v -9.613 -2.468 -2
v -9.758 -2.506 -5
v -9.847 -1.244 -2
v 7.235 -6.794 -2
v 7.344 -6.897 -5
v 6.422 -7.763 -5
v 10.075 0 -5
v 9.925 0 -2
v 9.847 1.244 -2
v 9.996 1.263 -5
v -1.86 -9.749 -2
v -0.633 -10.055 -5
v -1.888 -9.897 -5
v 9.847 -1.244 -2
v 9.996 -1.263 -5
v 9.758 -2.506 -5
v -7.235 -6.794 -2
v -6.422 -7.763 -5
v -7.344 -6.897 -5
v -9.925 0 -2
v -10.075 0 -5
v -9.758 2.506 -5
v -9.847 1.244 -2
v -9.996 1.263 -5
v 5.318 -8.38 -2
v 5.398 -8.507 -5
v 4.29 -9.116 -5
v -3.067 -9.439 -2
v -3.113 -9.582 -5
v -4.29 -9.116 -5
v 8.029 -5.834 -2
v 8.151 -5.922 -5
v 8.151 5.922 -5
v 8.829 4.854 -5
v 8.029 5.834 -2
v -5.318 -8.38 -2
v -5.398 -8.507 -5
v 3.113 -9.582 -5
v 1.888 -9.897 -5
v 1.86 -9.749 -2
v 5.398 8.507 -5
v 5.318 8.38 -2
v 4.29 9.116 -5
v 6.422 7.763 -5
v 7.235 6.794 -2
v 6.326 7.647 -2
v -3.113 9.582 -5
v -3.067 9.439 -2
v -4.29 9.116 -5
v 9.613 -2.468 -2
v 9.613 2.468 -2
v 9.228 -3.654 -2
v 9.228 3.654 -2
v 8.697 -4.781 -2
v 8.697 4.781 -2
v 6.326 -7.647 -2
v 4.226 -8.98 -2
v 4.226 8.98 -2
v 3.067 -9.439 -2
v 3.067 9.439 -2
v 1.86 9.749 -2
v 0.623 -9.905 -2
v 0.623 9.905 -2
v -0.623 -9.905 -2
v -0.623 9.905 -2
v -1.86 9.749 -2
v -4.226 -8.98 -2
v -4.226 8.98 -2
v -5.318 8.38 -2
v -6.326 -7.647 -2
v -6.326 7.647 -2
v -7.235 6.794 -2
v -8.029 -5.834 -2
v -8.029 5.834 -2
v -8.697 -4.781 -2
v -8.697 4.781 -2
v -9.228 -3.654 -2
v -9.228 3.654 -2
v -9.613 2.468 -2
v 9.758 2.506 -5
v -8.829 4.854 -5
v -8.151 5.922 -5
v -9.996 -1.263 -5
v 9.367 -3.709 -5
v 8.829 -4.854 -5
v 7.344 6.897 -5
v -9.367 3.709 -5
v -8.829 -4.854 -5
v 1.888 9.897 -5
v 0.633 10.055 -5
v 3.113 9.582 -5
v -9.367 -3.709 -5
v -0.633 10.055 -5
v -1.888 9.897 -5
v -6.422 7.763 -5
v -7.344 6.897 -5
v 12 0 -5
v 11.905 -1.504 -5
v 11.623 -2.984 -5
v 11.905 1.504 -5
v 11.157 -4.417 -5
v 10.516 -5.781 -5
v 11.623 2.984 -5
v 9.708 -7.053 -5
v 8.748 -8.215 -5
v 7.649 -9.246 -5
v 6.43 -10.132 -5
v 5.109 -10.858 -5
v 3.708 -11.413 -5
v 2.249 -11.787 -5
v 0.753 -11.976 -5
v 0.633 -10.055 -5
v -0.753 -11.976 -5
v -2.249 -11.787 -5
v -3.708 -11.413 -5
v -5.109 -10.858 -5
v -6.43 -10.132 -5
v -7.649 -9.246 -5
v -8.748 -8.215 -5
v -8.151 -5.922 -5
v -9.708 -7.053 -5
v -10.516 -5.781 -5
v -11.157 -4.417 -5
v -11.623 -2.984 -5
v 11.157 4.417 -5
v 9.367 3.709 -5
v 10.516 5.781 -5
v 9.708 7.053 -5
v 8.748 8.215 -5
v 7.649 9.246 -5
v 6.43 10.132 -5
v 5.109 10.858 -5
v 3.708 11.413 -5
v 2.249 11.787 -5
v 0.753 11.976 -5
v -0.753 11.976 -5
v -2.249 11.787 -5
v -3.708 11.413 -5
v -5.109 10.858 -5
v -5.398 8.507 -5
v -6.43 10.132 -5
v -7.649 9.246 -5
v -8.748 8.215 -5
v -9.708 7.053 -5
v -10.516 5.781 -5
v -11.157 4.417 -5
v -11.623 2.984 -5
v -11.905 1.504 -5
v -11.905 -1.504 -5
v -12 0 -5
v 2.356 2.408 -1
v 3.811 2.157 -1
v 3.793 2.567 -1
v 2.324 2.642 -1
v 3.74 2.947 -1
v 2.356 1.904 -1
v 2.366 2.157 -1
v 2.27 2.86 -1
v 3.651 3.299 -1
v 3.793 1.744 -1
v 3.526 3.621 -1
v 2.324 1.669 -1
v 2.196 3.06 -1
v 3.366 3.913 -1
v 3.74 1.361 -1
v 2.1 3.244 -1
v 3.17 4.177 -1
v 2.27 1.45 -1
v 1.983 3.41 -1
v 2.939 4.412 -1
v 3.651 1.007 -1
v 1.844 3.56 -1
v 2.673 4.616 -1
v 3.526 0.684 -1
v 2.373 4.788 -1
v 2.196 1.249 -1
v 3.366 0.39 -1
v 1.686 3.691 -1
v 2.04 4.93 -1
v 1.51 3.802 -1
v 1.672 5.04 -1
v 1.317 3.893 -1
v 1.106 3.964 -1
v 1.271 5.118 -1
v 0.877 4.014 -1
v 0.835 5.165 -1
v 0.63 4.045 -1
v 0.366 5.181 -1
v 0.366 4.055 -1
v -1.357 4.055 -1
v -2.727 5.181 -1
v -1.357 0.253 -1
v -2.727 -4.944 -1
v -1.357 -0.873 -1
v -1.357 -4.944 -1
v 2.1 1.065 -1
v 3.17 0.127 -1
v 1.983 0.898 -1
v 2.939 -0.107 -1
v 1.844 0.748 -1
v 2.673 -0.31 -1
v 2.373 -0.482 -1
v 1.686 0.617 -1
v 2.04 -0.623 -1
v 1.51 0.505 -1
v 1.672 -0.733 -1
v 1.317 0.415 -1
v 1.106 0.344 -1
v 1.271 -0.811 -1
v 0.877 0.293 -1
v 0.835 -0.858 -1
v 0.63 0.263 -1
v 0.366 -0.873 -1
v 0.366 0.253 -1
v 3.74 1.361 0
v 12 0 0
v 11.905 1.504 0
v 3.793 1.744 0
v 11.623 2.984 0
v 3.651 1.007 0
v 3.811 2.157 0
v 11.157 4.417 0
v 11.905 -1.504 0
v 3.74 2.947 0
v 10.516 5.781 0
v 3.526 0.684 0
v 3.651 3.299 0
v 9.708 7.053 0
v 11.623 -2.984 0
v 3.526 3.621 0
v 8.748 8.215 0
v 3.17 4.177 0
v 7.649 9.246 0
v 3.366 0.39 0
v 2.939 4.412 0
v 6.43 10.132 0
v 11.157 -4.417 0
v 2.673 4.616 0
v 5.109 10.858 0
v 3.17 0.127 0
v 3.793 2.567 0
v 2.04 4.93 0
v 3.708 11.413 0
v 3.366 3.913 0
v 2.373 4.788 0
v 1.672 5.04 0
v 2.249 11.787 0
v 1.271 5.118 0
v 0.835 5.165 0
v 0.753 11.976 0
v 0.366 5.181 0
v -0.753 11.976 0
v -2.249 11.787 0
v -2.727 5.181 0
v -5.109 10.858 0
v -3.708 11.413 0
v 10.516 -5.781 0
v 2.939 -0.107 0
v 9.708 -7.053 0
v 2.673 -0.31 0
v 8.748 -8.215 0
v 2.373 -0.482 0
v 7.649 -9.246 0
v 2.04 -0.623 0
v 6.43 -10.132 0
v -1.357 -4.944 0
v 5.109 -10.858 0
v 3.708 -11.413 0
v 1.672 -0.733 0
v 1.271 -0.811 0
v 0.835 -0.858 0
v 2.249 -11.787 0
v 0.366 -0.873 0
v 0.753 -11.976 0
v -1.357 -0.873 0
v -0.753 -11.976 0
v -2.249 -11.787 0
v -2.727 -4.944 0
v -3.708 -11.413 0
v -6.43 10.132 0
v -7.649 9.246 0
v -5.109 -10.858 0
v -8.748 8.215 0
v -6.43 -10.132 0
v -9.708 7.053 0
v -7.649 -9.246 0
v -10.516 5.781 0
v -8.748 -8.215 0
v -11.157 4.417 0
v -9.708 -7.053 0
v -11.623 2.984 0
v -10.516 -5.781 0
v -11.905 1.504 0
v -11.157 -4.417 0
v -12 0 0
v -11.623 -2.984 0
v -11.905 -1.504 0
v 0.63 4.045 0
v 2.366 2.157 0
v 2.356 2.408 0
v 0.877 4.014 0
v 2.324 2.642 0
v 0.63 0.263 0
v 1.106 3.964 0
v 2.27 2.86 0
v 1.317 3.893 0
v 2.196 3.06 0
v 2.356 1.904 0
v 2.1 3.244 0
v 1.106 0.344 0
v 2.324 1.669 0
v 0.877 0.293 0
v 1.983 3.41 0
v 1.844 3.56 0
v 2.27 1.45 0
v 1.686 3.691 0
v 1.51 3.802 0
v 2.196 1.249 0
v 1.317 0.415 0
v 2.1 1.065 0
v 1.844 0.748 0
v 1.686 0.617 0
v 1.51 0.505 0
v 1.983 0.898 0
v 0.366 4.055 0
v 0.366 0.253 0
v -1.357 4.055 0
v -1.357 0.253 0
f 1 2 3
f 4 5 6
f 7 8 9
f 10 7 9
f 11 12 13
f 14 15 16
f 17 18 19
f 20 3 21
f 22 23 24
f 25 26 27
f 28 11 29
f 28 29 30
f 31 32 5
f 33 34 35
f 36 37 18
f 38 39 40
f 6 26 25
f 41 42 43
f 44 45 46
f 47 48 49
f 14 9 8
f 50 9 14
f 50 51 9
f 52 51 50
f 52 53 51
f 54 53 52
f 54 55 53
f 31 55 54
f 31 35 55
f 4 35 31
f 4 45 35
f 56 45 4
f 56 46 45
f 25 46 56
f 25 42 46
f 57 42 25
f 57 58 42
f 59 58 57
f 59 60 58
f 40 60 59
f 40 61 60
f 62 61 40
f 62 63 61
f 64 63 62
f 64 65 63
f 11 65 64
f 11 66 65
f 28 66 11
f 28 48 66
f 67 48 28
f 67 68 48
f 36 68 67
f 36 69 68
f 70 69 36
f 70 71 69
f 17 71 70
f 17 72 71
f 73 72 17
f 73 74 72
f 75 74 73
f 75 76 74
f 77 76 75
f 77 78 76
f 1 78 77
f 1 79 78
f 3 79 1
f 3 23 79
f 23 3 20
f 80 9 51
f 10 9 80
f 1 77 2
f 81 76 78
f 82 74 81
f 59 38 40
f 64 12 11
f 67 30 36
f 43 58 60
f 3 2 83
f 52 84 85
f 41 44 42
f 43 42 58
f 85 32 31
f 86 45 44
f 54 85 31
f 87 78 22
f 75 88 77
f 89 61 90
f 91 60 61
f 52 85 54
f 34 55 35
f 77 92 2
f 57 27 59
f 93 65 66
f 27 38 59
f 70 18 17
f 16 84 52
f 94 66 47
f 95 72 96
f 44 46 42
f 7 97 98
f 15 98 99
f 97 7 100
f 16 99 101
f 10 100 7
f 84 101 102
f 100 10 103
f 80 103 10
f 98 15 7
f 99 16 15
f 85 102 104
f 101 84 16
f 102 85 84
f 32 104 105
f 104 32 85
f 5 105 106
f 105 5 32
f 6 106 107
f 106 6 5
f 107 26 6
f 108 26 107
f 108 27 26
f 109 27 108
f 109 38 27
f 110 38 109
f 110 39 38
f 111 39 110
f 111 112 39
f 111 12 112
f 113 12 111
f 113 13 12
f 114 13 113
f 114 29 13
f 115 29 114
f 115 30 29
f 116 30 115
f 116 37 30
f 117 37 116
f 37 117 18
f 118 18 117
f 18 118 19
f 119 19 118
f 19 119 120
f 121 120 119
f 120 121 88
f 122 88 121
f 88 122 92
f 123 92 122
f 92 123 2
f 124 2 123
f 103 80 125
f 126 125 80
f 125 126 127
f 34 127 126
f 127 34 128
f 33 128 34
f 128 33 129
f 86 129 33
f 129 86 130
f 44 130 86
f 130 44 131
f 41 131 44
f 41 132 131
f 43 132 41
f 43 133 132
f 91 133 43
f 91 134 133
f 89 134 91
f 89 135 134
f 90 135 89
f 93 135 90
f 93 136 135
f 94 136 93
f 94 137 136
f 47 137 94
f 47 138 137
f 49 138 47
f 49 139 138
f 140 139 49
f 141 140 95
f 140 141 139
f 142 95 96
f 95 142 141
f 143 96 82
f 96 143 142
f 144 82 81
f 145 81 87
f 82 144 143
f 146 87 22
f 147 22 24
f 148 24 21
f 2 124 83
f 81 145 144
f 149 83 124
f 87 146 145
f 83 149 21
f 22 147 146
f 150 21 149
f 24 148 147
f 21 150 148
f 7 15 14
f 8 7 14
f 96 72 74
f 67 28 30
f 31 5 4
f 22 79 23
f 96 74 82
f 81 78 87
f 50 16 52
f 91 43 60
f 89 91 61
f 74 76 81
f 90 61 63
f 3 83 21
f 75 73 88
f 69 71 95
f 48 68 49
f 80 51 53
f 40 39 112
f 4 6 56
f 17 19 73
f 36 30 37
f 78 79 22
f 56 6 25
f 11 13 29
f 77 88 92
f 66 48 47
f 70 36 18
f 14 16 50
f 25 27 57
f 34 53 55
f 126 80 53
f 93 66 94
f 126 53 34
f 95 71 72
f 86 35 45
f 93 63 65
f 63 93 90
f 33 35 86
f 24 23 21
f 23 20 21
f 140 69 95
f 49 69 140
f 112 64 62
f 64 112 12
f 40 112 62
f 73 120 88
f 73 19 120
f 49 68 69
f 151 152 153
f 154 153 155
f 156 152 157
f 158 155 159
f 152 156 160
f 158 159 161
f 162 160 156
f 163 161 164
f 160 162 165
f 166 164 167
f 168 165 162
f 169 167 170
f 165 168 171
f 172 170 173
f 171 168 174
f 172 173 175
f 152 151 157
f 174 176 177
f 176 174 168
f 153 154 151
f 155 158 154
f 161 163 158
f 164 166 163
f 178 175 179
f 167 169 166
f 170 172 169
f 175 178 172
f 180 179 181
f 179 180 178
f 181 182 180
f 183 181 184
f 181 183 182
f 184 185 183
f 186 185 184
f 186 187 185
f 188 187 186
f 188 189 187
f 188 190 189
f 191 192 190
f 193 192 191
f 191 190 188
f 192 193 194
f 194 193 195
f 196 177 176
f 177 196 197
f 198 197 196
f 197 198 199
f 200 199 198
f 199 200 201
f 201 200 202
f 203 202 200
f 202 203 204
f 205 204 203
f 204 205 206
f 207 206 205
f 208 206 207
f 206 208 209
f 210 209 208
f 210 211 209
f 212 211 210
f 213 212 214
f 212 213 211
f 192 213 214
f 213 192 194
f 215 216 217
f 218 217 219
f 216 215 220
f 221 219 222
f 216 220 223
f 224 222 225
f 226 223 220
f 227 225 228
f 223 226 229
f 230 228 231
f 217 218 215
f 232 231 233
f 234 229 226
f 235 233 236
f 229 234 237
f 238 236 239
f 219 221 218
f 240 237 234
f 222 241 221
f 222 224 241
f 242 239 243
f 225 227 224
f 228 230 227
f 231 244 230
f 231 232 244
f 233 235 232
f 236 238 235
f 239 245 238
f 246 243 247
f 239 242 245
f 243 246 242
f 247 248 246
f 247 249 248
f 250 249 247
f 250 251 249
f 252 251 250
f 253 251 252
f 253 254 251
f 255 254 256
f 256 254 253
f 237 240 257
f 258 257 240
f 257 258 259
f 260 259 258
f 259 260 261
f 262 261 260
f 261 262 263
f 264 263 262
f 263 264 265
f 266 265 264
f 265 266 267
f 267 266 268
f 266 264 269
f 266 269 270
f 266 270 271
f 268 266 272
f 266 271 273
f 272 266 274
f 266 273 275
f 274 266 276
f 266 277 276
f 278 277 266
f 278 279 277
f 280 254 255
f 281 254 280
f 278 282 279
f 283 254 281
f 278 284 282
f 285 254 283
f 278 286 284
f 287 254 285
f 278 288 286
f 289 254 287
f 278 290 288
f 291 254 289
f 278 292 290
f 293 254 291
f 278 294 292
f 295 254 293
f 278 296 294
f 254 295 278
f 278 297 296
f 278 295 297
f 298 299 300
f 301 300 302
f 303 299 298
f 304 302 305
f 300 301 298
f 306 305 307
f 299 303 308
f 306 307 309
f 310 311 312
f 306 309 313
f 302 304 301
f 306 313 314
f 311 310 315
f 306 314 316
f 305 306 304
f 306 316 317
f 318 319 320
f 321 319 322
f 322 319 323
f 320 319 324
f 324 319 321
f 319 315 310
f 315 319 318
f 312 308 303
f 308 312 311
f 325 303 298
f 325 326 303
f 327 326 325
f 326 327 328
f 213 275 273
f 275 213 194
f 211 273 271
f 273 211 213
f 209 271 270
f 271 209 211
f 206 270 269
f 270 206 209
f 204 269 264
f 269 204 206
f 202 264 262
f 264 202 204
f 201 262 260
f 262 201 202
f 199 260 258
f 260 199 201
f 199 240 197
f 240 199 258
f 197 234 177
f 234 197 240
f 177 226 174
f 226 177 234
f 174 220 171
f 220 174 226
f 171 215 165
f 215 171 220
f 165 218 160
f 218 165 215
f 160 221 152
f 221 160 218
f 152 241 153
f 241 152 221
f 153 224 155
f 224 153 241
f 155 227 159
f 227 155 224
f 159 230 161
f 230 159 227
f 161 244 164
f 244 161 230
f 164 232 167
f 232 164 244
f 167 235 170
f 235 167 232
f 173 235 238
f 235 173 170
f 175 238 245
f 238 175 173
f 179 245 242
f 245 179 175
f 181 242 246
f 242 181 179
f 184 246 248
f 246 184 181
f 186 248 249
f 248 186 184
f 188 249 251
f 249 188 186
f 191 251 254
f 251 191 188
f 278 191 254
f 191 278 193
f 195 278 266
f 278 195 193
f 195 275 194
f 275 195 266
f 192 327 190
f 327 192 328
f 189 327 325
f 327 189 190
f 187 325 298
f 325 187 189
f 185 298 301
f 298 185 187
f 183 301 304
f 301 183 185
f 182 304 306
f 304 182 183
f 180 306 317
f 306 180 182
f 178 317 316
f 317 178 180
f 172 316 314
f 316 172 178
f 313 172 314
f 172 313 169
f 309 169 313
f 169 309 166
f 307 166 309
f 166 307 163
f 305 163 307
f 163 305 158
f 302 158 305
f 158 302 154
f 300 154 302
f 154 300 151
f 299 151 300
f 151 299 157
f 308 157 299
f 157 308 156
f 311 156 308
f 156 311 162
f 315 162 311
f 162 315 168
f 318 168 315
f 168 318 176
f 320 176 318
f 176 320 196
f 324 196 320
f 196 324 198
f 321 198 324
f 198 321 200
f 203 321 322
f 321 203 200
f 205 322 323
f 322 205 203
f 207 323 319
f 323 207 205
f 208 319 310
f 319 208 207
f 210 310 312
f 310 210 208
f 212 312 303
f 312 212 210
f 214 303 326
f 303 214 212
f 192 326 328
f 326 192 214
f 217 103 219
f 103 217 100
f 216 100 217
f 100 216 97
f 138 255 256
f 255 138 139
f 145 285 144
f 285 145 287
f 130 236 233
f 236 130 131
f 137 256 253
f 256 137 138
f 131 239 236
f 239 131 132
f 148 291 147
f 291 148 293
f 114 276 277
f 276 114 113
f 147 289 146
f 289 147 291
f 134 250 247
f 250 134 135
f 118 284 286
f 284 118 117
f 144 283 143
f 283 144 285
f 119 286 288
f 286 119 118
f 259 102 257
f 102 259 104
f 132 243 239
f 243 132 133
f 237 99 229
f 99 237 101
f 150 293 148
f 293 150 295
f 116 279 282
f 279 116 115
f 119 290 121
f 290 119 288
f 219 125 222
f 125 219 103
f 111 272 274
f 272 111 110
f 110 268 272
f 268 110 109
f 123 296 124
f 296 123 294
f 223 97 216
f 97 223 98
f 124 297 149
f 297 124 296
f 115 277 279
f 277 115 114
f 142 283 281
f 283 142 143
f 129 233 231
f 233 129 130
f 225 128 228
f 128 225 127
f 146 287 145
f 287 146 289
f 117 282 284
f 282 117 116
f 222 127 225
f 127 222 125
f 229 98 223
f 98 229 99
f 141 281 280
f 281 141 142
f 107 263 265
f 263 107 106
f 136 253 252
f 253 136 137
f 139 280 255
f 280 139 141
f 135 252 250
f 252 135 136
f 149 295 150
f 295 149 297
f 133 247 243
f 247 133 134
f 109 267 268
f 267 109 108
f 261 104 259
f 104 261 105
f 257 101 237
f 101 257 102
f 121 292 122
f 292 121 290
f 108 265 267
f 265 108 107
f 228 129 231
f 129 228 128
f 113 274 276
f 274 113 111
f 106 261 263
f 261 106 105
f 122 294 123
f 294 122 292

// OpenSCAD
$fn = 50;

difference() {
	union() {
		translate(v = [0, 0, -5.0]) {
			cylinder(h = 5, r = 12.0);
		}
	}
	union() {
		#translate(v = [0, 0, -5.0]) {
			cylinder(h = 3, r1 = 10.075, r2 = 9.925);
		}
		translate(v = [0, 0, -1]) {
			linear_extrude(height = 1) {
				text(font = "Impact", halign = "center", size = 10, text = "P", valign = "center");
			}
		}
	}
}
